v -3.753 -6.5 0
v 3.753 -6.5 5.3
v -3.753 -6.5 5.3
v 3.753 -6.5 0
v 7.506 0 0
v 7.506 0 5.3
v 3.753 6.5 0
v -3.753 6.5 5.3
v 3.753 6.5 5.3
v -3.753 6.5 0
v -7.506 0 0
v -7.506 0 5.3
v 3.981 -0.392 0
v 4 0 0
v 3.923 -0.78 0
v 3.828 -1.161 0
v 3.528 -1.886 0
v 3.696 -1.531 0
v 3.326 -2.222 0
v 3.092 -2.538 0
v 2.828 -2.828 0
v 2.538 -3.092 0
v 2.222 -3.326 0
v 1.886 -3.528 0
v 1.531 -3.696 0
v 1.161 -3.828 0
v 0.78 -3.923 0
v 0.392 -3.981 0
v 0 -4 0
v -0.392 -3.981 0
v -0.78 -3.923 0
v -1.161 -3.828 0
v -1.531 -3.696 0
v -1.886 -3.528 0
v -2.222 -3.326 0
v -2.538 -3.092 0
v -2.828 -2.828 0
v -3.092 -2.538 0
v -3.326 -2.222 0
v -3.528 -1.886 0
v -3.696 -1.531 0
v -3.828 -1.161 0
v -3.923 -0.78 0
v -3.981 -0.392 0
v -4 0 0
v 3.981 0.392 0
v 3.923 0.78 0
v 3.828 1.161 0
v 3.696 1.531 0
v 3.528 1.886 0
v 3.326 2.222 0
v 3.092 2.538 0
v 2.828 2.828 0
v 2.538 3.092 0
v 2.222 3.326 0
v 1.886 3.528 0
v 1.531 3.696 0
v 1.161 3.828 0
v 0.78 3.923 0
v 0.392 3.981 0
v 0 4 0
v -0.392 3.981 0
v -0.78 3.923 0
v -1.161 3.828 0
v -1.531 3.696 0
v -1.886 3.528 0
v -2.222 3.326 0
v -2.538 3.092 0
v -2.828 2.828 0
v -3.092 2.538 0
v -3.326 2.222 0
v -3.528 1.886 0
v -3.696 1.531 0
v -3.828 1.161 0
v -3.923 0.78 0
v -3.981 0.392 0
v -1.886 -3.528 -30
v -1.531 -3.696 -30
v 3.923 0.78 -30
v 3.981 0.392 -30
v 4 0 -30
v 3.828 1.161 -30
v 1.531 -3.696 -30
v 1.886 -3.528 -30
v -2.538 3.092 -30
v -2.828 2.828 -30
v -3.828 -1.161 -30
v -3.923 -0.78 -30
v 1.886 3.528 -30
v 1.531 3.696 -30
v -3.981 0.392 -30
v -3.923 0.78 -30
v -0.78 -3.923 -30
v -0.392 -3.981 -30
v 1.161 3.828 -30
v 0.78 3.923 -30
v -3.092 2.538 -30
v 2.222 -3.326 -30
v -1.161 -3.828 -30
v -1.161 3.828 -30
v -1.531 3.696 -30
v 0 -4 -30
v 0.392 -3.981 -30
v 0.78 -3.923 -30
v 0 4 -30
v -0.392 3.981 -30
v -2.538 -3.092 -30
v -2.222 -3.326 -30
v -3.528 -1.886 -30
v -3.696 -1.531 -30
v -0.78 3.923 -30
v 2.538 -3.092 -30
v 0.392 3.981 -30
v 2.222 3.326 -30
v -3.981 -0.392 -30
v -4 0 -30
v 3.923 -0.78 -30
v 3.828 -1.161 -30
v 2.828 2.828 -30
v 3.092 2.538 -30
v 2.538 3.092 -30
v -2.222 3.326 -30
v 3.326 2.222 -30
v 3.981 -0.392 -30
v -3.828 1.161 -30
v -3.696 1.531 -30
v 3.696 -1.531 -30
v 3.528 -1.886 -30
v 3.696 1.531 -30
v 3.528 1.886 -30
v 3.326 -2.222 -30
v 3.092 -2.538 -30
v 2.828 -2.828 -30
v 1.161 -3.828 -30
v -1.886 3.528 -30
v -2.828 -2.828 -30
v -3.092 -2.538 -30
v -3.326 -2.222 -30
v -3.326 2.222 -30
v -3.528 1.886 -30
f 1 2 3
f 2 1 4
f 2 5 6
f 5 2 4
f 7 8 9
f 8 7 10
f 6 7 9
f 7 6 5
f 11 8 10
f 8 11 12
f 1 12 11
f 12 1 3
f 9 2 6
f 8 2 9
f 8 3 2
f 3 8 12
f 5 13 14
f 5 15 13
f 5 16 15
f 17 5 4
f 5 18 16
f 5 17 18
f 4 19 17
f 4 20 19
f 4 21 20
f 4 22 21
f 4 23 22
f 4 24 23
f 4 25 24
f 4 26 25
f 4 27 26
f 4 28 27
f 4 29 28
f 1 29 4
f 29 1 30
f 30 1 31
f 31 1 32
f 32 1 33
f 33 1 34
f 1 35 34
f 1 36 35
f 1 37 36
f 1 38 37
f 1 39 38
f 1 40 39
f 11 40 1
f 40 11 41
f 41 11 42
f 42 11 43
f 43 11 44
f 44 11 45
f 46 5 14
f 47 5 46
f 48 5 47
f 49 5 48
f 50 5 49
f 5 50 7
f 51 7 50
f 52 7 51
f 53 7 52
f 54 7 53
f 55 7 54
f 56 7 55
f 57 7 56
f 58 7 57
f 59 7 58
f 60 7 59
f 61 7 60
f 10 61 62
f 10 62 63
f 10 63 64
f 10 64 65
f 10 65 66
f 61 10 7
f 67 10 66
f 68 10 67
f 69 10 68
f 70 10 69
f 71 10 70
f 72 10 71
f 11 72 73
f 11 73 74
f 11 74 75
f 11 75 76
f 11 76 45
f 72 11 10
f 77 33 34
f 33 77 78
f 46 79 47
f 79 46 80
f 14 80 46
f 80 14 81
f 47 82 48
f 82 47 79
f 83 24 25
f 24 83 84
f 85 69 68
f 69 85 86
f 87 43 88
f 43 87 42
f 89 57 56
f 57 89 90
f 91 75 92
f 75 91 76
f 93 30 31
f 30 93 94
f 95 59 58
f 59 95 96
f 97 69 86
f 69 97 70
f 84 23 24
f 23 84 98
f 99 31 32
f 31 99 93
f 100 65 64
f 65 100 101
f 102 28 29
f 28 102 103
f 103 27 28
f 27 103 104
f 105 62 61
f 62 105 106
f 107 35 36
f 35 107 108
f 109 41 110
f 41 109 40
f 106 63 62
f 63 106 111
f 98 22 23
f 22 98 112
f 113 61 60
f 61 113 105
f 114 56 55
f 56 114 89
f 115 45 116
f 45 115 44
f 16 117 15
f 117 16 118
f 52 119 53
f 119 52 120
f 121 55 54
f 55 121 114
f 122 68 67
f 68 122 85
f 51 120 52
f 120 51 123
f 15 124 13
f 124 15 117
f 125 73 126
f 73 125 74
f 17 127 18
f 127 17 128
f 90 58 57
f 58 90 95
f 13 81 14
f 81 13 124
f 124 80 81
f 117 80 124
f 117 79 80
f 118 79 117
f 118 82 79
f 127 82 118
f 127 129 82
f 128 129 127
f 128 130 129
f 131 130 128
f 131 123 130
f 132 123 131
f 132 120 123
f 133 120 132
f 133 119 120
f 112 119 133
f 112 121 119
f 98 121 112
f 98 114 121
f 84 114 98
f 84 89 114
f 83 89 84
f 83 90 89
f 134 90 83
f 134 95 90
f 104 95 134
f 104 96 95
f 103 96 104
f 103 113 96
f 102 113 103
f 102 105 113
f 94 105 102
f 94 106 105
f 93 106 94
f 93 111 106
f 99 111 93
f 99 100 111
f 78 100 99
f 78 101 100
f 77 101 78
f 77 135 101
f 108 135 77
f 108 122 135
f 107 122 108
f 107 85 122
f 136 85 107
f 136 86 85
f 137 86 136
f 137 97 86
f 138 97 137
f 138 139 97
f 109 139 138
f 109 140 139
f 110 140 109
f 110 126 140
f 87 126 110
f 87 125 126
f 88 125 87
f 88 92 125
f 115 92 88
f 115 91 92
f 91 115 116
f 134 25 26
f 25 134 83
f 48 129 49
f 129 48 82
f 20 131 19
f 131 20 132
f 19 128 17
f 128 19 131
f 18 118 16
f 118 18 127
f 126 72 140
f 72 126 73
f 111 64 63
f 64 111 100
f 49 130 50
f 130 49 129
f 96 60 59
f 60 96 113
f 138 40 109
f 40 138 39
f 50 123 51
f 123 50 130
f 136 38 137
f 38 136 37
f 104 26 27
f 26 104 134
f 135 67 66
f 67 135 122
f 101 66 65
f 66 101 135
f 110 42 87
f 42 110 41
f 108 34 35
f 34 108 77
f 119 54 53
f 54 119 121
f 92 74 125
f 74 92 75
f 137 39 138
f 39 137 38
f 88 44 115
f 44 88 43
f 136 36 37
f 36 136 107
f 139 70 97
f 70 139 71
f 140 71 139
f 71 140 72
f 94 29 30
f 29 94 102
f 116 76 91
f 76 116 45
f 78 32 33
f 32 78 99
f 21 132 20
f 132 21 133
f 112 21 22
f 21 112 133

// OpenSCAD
$fn = 64;

union() {
    cylinder(h = 5.3, r = 13 / sqrt(3), $fn = 6);
    translate([0, 0, -30])
        cylinder(h = 30, d = 8);
}
